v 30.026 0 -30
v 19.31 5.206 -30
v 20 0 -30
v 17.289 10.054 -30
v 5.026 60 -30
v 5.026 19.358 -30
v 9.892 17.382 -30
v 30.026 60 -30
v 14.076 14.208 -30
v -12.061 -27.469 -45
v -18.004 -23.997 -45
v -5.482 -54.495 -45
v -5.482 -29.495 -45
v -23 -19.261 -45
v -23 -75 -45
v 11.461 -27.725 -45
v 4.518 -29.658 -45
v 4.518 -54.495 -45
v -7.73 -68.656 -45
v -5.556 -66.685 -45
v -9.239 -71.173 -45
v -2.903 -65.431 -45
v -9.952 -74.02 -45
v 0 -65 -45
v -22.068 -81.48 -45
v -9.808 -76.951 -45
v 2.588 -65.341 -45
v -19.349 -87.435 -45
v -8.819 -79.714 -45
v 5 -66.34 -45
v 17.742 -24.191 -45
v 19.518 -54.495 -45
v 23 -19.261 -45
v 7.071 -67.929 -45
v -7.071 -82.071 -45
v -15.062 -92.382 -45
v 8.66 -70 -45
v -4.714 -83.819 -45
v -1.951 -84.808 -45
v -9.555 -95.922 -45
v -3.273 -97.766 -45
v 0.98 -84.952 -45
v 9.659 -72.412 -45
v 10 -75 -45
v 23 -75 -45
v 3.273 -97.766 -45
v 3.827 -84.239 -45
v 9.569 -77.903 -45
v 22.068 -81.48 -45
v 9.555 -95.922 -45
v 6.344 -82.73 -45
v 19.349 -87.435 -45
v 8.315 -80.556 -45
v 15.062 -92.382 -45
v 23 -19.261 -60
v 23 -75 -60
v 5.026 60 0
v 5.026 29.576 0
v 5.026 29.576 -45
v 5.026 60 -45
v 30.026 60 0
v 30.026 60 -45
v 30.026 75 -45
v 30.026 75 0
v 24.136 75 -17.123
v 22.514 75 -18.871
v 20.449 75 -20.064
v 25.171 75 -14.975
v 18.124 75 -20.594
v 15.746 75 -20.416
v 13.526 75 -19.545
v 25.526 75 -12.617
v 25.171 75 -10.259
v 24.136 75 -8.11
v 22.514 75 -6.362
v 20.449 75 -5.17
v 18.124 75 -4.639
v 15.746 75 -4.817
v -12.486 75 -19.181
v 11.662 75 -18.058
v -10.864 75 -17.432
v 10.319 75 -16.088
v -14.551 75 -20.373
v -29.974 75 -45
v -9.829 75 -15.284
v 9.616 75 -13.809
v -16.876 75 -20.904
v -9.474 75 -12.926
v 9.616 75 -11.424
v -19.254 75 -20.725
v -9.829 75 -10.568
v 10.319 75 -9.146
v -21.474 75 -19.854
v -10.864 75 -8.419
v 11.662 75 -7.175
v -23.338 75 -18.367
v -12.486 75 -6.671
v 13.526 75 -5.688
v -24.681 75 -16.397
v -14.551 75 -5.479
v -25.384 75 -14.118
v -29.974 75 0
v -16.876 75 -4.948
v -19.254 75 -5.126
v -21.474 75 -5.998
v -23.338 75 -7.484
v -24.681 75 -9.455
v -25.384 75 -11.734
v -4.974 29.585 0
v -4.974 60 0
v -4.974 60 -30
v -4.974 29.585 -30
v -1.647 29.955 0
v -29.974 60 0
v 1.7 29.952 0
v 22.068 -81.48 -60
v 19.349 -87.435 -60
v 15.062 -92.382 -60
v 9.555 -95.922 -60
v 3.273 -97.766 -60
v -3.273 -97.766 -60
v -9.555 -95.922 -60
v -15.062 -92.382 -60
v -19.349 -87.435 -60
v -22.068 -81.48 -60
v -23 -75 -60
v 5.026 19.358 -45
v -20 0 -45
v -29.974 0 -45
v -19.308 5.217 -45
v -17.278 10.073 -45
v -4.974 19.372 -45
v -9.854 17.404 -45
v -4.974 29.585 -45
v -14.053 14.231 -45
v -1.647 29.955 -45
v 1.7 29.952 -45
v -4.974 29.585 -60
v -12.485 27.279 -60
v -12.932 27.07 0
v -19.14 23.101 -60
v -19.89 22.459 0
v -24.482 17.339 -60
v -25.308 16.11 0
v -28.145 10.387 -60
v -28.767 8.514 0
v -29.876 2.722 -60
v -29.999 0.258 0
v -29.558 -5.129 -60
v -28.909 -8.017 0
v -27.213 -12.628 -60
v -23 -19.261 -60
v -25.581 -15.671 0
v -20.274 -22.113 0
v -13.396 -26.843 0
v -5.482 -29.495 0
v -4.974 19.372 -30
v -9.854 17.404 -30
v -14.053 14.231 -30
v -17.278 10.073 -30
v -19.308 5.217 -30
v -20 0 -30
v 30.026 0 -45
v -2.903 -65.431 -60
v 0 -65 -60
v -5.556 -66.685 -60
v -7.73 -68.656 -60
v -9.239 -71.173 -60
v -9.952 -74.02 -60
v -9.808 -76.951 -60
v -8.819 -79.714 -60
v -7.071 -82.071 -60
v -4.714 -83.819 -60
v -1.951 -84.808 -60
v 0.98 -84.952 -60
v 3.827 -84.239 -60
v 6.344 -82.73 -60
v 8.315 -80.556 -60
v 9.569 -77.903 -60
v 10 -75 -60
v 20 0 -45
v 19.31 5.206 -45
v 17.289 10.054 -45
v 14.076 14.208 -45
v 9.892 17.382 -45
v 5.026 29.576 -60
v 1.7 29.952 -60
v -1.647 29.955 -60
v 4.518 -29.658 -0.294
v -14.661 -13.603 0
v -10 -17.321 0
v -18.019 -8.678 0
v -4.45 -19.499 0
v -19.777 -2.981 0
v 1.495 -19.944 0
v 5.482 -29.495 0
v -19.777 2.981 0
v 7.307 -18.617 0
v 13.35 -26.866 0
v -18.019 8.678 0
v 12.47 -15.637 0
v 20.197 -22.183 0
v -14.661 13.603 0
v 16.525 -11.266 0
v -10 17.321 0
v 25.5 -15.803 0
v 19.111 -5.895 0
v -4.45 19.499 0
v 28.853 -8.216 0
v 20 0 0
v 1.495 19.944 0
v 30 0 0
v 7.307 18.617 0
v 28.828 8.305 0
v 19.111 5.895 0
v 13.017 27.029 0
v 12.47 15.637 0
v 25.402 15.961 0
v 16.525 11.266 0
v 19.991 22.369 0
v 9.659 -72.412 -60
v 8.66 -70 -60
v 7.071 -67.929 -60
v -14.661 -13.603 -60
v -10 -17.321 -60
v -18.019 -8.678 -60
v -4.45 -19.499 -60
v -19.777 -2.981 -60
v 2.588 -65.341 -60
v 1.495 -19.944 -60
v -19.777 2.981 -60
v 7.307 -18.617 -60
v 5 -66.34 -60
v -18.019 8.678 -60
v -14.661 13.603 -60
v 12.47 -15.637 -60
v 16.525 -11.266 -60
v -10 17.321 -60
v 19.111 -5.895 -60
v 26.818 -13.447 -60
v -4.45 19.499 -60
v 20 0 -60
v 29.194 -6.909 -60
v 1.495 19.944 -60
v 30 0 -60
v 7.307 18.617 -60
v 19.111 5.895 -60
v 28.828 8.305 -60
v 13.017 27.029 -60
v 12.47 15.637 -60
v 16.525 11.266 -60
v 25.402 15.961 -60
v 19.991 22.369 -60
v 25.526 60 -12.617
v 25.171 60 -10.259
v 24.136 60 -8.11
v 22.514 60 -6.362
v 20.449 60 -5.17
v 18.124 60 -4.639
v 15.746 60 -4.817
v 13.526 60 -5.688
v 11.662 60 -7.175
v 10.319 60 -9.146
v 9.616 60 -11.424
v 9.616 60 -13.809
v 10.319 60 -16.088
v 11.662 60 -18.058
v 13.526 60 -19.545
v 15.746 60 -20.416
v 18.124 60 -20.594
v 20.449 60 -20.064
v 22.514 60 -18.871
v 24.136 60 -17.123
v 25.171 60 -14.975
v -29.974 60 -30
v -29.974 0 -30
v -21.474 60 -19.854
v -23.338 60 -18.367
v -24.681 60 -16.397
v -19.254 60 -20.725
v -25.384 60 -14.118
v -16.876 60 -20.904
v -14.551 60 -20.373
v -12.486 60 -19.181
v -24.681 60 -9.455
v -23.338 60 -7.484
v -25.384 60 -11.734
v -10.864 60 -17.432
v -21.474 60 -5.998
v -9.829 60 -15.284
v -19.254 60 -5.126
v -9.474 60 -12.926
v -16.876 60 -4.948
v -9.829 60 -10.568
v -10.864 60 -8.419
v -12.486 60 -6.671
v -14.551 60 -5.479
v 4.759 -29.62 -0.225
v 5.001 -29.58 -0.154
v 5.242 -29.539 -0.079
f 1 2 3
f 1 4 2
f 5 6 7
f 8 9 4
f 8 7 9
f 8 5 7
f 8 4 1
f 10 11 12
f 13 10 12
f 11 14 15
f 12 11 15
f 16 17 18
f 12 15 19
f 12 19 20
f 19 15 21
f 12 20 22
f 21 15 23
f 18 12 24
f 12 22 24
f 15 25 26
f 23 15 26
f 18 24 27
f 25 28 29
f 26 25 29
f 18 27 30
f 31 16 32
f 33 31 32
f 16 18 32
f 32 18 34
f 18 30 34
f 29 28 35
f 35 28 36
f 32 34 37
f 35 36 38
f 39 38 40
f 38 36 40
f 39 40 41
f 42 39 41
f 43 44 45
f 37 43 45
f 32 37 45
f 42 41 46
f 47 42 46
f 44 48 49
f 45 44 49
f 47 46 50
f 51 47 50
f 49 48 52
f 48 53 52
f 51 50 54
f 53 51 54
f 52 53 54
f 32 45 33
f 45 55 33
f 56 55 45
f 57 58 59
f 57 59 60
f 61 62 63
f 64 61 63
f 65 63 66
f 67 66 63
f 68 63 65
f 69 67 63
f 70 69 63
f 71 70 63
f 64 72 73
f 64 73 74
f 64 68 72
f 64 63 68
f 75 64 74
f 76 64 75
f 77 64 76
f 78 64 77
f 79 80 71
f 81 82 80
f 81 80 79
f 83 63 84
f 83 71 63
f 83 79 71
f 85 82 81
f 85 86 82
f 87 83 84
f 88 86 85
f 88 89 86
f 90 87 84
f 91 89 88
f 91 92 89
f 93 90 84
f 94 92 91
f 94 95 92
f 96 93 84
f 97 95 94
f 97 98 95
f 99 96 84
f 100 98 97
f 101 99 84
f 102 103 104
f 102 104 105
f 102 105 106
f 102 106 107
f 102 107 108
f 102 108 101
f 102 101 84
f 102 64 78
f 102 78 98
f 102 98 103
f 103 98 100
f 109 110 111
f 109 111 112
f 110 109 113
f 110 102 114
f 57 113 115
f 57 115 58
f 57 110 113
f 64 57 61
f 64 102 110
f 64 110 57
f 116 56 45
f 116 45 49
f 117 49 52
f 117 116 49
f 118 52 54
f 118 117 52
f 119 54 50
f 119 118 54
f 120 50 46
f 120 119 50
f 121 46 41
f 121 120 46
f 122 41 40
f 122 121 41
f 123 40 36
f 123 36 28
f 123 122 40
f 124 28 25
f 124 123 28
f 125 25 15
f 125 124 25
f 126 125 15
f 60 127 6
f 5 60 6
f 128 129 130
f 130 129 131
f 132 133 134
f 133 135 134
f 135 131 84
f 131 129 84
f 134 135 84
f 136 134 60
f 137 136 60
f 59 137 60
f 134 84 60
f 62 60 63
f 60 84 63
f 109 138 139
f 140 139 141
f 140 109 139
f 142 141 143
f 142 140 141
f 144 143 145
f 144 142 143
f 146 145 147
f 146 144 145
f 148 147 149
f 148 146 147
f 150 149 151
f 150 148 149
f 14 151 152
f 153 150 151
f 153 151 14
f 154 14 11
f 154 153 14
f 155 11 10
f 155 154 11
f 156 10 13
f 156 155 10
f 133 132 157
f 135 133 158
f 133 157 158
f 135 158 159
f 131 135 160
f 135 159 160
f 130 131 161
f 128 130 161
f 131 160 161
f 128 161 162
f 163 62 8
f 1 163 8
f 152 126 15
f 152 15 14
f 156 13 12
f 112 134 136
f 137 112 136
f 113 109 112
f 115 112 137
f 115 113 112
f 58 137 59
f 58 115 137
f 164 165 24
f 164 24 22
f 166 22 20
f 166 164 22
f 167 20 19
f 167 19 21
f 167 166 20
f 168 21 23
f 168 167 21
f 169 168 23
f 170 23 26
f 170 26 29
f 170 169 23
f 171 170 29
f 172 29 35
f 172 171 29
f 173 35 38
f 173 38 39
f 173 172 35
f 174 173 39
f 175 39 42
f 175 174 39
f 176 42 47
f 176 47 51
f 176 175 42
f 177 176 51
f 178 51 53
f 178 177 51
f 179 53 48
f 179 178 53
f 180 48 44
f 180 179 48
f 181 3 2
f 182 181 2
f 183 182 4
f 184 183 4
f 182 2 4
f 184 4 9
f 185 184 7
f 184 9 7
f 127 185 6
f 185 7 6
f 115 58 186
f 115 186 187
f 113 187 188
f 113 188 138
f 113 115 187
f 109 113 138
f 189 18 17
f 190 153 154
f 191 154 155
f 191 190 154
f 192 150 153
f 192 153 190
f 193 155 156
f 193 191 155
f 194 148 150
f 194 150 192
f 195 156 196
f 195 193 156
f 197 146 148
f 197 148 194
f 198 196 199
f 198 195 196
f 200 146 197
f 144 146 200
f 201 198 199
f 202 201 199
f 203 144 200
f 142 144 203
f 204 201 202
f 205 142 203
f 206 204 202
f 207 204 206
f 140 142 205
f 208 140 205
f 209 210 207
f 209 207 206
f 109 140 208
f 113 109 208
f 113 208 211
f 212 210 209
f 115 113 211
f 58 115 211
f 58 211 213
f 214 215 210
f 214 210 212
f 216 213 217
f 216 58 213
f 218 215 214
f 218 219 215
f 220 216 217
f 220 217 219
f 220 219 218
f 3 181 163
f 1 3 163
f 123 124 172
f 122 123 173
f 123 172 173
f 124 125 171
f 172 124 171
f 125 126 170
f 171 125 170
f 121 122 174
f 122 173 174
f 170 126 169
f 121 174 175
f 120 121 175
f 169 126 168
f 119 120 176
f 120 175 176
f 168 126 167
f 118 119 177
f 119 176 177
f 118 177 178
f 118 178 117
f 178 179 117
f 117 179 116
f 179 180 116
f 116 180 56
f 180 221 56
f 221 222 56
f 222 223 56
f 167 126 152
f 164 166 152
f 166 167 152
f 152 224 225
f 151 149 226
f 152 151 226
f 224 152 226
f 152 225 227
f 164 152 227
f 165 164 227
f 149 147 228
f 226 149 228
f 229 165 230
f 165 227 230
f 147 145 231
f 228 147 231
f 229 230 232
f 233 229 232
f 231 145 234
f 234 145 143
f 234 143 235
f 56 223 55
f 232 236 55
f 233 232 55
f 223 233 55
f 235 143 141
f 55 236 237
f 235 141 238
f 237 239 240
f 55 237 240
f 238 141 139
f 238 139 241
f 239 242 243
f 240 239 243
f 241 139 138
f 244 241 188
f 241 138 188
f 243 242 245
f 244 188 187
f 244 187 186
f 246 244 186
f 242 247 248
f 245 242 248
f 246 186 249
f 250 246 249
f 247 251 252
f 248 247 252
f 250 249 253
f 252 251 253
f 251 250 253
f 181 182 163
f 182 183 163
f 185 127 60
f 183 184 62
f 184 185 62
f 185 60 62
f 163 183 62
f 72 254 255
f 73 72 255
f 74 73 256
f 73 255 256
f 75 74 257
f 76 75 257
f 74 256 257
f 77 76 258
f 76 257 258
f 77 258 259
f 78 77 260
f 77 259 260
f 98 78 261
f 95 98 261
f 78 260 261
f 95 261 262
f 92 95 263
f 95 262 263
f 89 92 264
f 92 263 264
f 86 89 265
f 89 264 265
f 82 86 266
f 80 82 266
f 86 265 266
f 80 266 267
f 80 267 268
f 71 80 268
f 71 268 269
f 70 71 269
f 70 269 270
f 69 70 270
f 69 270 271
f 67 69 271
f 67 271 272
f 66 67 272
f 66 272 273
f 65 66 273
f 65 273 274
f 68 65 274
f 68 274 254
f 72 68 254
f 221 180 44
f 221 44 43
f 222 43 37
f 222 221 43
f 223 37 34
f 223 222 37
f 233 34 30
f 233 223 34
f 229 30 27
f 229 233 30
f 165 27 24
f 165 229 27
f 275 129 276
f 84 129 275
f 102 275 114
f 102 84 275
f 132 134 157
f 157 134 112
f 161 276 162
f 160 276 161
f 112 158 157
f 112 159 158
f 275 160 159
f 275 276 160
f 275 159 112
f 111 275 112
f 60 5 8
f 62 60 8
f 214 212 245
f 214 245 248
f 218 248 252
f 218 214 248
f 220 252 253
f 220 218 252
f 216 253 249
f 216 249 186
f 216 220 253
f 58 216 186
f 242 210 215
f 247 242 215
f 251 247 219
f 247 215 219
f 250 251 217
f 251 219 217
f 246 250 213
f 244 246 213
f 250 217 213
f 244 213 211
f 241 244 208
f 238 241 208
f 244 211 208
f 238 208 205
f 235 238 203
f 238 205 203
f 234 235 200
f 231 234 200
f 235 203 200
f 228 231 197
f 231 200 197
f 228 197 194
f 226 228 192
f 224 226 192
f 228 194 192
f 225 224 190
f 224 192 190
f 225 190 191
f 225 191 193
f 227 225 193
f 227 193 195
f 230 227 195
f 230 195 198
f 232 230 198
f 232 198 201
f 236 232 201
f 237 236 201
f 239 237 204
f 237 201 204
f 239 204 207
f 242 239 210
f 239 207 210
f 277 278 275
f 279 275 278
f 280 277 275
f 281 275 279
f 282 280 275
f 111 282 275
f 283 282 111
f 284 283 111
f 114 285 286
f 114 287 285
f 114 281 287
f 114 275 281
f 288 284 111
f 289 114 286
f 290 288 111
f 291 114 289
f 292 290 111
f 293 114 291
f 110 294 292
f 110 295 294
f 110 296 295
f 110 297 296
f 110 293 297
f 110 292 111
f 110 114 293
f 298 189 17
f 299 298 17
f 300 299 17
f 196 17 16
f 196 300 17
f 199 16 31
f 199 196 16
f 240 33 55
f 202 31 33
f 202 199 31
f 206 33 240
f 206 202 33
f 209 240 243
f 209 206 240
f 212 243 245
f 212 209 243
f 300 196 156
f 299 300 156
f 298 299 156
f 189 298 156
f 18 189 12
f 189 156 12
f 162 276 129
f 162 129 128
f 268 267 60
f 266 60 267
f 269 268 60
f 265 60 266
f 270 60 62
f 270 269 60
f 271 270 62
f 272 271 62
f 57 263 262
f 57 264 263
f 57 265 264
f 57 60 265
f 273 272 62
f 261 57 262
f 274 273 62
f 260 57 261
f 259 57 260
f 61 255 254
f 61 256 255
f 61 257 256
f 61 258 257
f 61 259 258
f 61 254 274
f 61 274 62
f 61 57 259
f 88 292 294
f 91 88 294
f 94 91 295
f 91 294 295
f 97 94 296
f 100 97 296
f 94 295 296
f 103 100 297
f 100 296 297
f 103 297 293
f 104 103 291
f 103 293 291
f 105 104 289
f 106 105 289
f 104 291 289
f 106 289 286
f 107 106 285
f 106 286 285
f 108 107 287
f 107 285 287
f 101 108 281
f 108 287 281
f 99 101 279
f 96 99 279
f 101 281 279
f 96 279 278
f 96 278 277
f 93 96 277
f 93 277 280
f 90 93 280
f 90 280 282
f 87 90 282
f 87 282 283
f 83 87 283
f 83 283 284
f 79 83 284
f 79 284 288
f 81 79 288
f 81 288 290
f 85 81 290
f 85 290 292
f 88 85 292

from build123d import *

# Parameters (mm, degrees)
F0_R      = 20
F1_DEPTH  = 60
F2_DEPTH  = 45
F3_R      = 8
F4_DEPTH  = 25
F6_DEPTH  = 15
F8_DEPTH  = 45
F10_DEPTH = 25
F11_W     = 25
F11_H     = 15
F12_DEPTH = 60
F13_W     = 25
F13_H     = 15
F14_DEPTH = 60
F15_DEPTH = 60.001


with BuildPart() as f1:
    # F0 (on Top) → F1 (new body)
    with BuildSketch(Plane.XY):
        with BuildLine():
            ThreePointArc((-4.9735443536, 29.5848585692), (-19.3751602495, -22.9042171948), (30, 0))
            ThreePointArc((30, 0), (22.921536482, 19.3546677911), (5.0264556464, 29.5759149247))
            ThreePointArc((5.0264556464, 29.5759149247), (0.0268309228, 29.9999880017), (-4.9735443536, 29.5848585692))
        make_face()
        Circle(F0_R, mode=Mode.SUBTRACT)
    extrude(amount=-F1_DEPTH)

    # F5 (on face) → F6 (join)
    with BuildSketch(Plane(origin=(0, 0, -60), x_dir=(1, 0, 0), z_dir=(0, 0, -1))):
        with BuildLine():
            ThreePointArc((-23, 19.2613602843), (-12.6917136643, 27.1830904105), (0, 30))
            ThreePointArc((0, 30), (12.6917136643, 27.1830904105), (23, 19.2613602843))
            Line((23, 19.2613602843), (23, 75))
            ThreePointArc((23, 75), (0, 98), (-23, 75))
            Line((-23, 75), (-23, 19.2613602843))
        make_face()
        with BuildLine():
            ThreePointArc((10, 75), (7.0710678119, 67.9289321881), (0, 65))
            ThreePointArc((0, 65), (-7.0710678119, 82.0710678119), (10, 75))
        make_face(mode=Mode.SUBTRACT)
    extrude(amount=-F6_DEPTH)

    # F7 (on Top) → F8 (join)
    with BuildSketch(Plane.XY):
        with BuildLine():
            ThreePointArc((4.5176299661, -29.6578997822), (-0.4892143627, -29.9960108899), (-5.4823700339, -29.4948066414))
            Line((-5.4823700339, -29.4948066414), (-5.4823700339, -54.4948066414))
            Line((-5.4823700339, -54.4948066414), (4.5176299661, -54.4948066414))
            Line((4.5176299661, -54.4948066414), (4.5176299661, -29.6578997822))
        make_face()
    extrude(amount=-F8_DEPTH)

    # F9 (on face) → F10 (cut)
    with BuildSketch(Plane(origin=(-5.4823700339, 0, 0), x_dir=(0, -1, 0), z_dir=(-1, 0, 0))):
        Polygon((54.4948066414, 0), (29.4948066414, 0), (54.4948066414, -45), align=None)
    extrude(amount=-F10_DEPTH, mode=Mode.SUBTRACT)


with BuildPart() as f2:
    # F0 (on Top) → F2 (new body)
    with BuildSketch(Plane.XY):
        with BuildLine():
            ThreePointArc((-4.9735443536, 29.5848585692), (0.0268309228, 29.9999880017), (5.0264556464, 29.5759149247))
            Line((5.0264556464, 29.5759149247), (5.0264556464, 60))
            Line((5.0264556464, 60), (30.0264556464, 60))
            Line((30.0264556464, 60), (30.0264556464, 75))
            Line((30.0264556464, 75), (-29.9735443536, 75))
            Line((-29.9735443536, 75), (-29.9735443536, 60))
            Line((-29.9735443536, 60), (-4.9735443536, 60))
            Line((-4.9735443536, 60), (-4.9735443536, 29.5848585692))
        make_face()
    extrude(amount=-F2_DEPTH)

    # F3 (on face) → F4 (cut)
    with BuildSketch(Plane.XZ.offset(-60)):
        with Locations((-17.4735443536, -12.9258744419)):
            Circle(F3_R)
        with Locations((17.5264556464, -12.6165784895)):
            Circle(F3_R)
    extrude(amount=-F4_DEPTH, mode=Mode.SUBTRACT)

    # F11 (on face) → F12 (join)
    with BuildSketch(Plane.XZ.offset(-60)):
        with Locations((-17.4735443536, -37.5)):
            Rectangle(F11_W, F11_H)
    extrude(amount=F12_DEPTH)


with BuildPart() as f14:
    # F13 (on face) → F14 (new body)
    with BuildSketch(Plane.XZ.offset(-60)):
        with Locations((17.5264556464, -37.5)):
            Rectangle(F13_W, F13_H)
    extrude(amount=F14_DEPTH)


with BuildPart() as f15_tool:
    # F0 (on Top) → F15 (new body, through all)
    with BuildSketch(Plane.XY):
        Circle(F0_R)
    extrude(amount=-F15_DEPTH)


with BuildPart() as f2_1:
    add(f2.part)

    # F15: cut by f15_tool
    add(f15_tool.part, mode=Mode.SUBTRACT)


with BuildPart() as f14_1:
    add(f14.part)

    # F15: cut by f15_tool
    add(f15_tool.part, mode=Mode.SUBTRACT)


solid = Compound([f1.part, f2_1.part, f14_1.part])
